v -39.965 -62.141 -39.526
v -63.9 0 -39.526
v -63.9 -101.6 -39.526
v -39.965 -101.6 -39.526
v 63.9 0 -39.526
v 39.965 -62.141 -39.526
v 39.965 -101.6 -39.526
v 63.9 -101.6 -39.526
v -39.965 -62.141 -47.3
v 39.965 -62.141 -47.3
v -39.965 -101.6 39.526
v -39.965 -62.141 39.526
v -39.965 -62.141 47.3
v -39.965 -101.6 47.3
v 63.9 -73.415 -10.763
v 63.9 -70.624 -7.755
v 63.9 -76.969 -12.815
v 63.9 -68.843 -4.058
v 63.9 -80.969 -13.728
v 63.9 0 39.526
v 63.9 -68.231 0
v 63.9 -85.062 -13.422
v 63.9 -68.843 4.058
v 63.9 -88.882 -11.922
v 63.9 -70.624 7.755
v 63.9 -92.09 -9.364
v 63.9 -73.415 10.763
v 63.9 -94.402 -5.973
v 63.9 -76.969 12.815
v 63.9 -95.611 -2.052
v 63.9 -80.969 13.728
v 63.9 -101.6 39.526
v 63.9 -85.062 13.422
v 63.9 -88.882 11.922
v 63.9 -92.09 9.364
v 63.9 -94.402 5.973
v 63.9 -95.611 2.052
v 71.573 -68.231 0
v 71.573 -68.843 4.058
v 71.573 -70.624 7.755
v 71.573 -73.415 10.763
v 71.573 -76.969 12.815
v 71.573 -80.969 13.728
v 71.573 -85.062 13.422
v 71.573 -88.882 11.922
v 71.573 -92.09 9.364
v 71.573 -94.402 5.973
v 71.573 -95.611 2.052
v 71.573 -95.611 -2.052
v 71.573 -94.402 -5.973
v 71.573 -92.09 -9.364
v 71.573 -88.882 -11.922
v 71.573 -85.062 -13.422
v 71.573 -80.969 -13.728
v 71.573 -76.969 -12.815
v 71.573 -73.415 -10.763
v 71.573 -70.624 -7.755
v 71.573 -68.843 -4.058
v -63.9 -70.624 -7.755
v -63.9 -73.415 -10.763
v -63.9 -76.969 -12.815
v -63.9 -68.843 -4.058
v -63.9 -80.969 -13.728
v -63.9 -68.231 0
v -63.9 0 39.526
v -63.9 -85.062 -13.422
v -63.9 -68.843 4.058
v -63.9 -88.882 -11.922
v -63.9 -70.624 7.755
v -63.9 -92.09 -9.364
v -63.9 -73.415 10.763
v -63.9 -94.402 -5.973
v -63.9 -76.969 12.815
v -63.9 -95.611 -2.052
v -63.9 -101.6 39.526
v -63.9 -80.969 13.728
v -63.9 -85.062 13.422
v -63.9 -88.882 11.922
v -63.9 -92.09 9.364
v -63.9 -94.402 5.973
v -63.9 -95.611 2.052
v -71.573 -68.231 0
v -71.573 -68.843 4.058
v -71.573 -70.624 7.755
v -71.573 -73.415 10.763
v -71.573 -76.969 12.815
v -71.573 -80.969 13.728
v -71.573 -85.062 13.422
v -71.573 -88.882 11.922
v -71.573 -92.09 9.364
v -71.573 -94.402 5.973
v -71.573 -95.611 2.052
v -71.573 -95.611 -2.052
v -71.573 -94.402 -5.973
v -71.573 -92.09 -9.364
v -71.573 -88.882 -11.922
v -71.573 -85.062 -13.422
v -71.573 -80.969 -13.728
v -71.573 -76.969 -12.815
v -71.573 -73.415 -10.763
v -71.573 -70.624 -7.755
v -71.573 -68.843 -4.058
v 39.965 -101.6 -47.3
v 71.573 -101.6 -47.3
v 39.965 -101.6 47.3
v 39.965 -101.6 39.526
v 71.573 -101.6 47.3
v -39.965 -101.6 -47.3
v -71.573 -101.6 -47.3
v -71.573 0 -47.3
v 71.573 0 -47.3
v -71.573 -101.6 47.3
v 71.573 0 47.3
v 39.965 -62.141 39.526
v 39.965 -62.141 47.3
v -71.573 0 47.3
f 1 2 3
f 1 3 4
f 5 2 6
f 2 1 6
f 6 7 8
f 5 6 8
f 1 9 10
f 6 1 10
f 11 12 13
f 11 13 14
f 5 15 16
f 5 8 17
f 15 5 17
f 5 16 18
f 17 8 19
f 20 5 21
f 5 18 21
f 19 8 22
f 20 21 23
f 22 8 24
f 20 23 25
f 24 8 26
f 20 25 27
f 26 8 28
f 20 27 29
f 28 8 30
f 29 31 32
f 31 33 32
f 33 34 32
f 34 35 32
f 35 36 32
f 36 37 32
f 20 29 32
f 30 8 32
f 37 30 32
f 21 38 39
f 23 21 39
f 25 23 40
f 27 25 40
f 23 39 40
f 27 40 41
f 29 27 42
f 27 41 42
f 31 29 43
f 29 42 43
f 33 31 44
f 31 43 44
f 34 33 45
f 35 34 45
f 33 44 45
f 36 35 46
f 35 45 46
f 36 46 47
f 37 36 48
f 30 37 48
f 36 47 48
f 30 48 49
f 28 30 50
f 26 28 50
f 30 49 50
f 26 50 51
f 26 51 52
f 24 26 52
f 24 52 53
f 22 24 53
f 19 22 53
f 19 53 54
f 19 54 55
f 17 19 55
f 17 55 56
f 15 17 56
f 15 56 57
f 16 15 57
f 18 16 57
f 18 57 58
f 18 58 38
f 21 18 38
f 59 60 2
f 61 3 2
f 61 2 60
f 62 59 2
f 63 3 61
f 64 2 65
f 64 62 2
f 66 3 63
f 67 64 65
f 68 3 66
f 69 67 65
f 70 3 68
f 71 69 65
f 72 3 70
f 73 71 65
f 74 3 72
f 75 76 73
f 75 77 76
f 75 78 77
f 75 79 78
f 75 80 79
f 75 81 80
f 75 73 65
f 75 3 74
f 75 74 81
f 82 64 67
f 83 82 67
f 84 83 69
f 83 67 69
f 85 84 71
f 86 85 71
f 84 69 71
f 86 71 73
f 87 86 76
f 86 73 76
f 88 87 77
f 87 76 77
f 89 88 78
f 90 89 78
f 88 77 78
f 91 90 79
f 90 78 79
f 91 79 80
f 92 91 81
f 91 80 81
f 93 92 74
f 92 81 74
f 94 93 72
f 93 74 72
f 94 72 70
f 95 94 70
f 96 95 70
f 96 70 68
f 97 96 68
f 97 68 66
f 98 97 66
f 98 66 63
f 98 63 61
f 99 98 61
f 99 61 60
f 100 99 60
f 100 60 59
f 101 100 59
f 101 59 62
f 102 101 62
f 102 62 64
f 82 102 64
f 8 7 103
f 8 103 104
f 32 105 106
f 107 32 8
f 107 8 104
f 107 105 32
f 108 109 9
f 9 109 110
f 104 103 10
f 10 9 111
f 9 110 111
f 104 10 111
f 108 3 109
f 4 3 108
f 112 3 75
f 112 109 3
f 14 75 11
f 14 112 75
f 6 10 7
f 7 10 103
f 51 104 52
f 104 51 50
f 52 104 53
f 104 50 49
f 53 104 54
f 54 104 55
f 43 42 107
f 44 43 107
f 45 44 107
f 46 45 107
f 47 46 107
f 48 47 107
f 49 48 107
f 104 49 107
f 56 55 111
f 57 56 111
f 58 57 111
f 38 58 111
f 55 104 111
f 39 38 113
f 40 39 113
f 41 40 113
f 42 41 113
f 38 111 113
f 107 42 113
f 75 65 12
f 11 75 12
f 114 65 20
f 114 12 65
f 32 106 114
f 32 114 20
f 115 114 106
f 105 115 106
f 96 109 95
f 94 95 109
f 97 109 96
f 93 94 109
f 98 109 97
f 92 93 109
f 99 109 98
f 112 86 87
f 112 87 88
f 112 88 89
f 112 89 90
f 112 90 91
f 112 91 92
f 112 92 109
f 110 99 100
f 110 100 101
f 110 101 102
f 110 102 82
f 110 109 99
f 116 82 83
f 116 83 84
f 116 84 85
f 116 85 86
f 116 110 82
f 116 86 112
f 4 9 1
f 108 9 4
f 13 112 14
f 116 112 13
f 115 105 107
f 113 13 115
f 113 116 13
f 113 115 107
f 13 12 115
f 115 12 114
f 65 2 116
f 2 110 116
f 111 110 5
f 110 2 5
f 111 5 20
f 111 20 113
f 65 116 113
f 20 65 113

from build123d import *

# Parameters (mm, degrees)
F0_W     = 143.145382
F0_H     = 94.600484
F1_DEPTH = 101.6
F2_W     = 127.800316
F2_H     = 79.051822
F3_DEPTH = 127
F4_W     = 79.930096
F4_H     = 39.45935
F5_DEPTH = 127
F6_R     = 13.766845
F7_DEPTH = 152.4


with BuildPart() as f1:
    # F0 (on Front) → F1 (new body)
    with BuildSketch(Plane.XZ):
        Rectangle(F0_W, F0_H)
    extrude(amount=F1_DEPTH)

    # F2 (on face) → F3 (cut)
    with BuildSketch(Plane.XZ.offset(101.6)):
        Rectangle(F2_W, F2_H)
    extrude(amount=-F3_DEPTH, mode=Mode.SUBTRACT)

    # F4 (on face) → F5 (cut)
    with BuildSketch(Plane(origin=(0, 0, -47.300242), x_dir=(1, 0, 0), z_dir=(0, 0, -1))):
        with Locations((0, 81.870325)):
            Rectangle(F4_W, F4_H)
    extrude(amount=-F5_DEPTH, mode=Mode.SUBTRACT)

    # F6 (on face) → F7 (cut)
    with BuildSketch(Plane.YZ.offset(71.572691)):
        with Locations((-81.998244, 0)):
            Circle(F6_R)
    extrude(amount=-F7_DEPTH, mode=Mode.SUBTRACT)


solid = f1.part
